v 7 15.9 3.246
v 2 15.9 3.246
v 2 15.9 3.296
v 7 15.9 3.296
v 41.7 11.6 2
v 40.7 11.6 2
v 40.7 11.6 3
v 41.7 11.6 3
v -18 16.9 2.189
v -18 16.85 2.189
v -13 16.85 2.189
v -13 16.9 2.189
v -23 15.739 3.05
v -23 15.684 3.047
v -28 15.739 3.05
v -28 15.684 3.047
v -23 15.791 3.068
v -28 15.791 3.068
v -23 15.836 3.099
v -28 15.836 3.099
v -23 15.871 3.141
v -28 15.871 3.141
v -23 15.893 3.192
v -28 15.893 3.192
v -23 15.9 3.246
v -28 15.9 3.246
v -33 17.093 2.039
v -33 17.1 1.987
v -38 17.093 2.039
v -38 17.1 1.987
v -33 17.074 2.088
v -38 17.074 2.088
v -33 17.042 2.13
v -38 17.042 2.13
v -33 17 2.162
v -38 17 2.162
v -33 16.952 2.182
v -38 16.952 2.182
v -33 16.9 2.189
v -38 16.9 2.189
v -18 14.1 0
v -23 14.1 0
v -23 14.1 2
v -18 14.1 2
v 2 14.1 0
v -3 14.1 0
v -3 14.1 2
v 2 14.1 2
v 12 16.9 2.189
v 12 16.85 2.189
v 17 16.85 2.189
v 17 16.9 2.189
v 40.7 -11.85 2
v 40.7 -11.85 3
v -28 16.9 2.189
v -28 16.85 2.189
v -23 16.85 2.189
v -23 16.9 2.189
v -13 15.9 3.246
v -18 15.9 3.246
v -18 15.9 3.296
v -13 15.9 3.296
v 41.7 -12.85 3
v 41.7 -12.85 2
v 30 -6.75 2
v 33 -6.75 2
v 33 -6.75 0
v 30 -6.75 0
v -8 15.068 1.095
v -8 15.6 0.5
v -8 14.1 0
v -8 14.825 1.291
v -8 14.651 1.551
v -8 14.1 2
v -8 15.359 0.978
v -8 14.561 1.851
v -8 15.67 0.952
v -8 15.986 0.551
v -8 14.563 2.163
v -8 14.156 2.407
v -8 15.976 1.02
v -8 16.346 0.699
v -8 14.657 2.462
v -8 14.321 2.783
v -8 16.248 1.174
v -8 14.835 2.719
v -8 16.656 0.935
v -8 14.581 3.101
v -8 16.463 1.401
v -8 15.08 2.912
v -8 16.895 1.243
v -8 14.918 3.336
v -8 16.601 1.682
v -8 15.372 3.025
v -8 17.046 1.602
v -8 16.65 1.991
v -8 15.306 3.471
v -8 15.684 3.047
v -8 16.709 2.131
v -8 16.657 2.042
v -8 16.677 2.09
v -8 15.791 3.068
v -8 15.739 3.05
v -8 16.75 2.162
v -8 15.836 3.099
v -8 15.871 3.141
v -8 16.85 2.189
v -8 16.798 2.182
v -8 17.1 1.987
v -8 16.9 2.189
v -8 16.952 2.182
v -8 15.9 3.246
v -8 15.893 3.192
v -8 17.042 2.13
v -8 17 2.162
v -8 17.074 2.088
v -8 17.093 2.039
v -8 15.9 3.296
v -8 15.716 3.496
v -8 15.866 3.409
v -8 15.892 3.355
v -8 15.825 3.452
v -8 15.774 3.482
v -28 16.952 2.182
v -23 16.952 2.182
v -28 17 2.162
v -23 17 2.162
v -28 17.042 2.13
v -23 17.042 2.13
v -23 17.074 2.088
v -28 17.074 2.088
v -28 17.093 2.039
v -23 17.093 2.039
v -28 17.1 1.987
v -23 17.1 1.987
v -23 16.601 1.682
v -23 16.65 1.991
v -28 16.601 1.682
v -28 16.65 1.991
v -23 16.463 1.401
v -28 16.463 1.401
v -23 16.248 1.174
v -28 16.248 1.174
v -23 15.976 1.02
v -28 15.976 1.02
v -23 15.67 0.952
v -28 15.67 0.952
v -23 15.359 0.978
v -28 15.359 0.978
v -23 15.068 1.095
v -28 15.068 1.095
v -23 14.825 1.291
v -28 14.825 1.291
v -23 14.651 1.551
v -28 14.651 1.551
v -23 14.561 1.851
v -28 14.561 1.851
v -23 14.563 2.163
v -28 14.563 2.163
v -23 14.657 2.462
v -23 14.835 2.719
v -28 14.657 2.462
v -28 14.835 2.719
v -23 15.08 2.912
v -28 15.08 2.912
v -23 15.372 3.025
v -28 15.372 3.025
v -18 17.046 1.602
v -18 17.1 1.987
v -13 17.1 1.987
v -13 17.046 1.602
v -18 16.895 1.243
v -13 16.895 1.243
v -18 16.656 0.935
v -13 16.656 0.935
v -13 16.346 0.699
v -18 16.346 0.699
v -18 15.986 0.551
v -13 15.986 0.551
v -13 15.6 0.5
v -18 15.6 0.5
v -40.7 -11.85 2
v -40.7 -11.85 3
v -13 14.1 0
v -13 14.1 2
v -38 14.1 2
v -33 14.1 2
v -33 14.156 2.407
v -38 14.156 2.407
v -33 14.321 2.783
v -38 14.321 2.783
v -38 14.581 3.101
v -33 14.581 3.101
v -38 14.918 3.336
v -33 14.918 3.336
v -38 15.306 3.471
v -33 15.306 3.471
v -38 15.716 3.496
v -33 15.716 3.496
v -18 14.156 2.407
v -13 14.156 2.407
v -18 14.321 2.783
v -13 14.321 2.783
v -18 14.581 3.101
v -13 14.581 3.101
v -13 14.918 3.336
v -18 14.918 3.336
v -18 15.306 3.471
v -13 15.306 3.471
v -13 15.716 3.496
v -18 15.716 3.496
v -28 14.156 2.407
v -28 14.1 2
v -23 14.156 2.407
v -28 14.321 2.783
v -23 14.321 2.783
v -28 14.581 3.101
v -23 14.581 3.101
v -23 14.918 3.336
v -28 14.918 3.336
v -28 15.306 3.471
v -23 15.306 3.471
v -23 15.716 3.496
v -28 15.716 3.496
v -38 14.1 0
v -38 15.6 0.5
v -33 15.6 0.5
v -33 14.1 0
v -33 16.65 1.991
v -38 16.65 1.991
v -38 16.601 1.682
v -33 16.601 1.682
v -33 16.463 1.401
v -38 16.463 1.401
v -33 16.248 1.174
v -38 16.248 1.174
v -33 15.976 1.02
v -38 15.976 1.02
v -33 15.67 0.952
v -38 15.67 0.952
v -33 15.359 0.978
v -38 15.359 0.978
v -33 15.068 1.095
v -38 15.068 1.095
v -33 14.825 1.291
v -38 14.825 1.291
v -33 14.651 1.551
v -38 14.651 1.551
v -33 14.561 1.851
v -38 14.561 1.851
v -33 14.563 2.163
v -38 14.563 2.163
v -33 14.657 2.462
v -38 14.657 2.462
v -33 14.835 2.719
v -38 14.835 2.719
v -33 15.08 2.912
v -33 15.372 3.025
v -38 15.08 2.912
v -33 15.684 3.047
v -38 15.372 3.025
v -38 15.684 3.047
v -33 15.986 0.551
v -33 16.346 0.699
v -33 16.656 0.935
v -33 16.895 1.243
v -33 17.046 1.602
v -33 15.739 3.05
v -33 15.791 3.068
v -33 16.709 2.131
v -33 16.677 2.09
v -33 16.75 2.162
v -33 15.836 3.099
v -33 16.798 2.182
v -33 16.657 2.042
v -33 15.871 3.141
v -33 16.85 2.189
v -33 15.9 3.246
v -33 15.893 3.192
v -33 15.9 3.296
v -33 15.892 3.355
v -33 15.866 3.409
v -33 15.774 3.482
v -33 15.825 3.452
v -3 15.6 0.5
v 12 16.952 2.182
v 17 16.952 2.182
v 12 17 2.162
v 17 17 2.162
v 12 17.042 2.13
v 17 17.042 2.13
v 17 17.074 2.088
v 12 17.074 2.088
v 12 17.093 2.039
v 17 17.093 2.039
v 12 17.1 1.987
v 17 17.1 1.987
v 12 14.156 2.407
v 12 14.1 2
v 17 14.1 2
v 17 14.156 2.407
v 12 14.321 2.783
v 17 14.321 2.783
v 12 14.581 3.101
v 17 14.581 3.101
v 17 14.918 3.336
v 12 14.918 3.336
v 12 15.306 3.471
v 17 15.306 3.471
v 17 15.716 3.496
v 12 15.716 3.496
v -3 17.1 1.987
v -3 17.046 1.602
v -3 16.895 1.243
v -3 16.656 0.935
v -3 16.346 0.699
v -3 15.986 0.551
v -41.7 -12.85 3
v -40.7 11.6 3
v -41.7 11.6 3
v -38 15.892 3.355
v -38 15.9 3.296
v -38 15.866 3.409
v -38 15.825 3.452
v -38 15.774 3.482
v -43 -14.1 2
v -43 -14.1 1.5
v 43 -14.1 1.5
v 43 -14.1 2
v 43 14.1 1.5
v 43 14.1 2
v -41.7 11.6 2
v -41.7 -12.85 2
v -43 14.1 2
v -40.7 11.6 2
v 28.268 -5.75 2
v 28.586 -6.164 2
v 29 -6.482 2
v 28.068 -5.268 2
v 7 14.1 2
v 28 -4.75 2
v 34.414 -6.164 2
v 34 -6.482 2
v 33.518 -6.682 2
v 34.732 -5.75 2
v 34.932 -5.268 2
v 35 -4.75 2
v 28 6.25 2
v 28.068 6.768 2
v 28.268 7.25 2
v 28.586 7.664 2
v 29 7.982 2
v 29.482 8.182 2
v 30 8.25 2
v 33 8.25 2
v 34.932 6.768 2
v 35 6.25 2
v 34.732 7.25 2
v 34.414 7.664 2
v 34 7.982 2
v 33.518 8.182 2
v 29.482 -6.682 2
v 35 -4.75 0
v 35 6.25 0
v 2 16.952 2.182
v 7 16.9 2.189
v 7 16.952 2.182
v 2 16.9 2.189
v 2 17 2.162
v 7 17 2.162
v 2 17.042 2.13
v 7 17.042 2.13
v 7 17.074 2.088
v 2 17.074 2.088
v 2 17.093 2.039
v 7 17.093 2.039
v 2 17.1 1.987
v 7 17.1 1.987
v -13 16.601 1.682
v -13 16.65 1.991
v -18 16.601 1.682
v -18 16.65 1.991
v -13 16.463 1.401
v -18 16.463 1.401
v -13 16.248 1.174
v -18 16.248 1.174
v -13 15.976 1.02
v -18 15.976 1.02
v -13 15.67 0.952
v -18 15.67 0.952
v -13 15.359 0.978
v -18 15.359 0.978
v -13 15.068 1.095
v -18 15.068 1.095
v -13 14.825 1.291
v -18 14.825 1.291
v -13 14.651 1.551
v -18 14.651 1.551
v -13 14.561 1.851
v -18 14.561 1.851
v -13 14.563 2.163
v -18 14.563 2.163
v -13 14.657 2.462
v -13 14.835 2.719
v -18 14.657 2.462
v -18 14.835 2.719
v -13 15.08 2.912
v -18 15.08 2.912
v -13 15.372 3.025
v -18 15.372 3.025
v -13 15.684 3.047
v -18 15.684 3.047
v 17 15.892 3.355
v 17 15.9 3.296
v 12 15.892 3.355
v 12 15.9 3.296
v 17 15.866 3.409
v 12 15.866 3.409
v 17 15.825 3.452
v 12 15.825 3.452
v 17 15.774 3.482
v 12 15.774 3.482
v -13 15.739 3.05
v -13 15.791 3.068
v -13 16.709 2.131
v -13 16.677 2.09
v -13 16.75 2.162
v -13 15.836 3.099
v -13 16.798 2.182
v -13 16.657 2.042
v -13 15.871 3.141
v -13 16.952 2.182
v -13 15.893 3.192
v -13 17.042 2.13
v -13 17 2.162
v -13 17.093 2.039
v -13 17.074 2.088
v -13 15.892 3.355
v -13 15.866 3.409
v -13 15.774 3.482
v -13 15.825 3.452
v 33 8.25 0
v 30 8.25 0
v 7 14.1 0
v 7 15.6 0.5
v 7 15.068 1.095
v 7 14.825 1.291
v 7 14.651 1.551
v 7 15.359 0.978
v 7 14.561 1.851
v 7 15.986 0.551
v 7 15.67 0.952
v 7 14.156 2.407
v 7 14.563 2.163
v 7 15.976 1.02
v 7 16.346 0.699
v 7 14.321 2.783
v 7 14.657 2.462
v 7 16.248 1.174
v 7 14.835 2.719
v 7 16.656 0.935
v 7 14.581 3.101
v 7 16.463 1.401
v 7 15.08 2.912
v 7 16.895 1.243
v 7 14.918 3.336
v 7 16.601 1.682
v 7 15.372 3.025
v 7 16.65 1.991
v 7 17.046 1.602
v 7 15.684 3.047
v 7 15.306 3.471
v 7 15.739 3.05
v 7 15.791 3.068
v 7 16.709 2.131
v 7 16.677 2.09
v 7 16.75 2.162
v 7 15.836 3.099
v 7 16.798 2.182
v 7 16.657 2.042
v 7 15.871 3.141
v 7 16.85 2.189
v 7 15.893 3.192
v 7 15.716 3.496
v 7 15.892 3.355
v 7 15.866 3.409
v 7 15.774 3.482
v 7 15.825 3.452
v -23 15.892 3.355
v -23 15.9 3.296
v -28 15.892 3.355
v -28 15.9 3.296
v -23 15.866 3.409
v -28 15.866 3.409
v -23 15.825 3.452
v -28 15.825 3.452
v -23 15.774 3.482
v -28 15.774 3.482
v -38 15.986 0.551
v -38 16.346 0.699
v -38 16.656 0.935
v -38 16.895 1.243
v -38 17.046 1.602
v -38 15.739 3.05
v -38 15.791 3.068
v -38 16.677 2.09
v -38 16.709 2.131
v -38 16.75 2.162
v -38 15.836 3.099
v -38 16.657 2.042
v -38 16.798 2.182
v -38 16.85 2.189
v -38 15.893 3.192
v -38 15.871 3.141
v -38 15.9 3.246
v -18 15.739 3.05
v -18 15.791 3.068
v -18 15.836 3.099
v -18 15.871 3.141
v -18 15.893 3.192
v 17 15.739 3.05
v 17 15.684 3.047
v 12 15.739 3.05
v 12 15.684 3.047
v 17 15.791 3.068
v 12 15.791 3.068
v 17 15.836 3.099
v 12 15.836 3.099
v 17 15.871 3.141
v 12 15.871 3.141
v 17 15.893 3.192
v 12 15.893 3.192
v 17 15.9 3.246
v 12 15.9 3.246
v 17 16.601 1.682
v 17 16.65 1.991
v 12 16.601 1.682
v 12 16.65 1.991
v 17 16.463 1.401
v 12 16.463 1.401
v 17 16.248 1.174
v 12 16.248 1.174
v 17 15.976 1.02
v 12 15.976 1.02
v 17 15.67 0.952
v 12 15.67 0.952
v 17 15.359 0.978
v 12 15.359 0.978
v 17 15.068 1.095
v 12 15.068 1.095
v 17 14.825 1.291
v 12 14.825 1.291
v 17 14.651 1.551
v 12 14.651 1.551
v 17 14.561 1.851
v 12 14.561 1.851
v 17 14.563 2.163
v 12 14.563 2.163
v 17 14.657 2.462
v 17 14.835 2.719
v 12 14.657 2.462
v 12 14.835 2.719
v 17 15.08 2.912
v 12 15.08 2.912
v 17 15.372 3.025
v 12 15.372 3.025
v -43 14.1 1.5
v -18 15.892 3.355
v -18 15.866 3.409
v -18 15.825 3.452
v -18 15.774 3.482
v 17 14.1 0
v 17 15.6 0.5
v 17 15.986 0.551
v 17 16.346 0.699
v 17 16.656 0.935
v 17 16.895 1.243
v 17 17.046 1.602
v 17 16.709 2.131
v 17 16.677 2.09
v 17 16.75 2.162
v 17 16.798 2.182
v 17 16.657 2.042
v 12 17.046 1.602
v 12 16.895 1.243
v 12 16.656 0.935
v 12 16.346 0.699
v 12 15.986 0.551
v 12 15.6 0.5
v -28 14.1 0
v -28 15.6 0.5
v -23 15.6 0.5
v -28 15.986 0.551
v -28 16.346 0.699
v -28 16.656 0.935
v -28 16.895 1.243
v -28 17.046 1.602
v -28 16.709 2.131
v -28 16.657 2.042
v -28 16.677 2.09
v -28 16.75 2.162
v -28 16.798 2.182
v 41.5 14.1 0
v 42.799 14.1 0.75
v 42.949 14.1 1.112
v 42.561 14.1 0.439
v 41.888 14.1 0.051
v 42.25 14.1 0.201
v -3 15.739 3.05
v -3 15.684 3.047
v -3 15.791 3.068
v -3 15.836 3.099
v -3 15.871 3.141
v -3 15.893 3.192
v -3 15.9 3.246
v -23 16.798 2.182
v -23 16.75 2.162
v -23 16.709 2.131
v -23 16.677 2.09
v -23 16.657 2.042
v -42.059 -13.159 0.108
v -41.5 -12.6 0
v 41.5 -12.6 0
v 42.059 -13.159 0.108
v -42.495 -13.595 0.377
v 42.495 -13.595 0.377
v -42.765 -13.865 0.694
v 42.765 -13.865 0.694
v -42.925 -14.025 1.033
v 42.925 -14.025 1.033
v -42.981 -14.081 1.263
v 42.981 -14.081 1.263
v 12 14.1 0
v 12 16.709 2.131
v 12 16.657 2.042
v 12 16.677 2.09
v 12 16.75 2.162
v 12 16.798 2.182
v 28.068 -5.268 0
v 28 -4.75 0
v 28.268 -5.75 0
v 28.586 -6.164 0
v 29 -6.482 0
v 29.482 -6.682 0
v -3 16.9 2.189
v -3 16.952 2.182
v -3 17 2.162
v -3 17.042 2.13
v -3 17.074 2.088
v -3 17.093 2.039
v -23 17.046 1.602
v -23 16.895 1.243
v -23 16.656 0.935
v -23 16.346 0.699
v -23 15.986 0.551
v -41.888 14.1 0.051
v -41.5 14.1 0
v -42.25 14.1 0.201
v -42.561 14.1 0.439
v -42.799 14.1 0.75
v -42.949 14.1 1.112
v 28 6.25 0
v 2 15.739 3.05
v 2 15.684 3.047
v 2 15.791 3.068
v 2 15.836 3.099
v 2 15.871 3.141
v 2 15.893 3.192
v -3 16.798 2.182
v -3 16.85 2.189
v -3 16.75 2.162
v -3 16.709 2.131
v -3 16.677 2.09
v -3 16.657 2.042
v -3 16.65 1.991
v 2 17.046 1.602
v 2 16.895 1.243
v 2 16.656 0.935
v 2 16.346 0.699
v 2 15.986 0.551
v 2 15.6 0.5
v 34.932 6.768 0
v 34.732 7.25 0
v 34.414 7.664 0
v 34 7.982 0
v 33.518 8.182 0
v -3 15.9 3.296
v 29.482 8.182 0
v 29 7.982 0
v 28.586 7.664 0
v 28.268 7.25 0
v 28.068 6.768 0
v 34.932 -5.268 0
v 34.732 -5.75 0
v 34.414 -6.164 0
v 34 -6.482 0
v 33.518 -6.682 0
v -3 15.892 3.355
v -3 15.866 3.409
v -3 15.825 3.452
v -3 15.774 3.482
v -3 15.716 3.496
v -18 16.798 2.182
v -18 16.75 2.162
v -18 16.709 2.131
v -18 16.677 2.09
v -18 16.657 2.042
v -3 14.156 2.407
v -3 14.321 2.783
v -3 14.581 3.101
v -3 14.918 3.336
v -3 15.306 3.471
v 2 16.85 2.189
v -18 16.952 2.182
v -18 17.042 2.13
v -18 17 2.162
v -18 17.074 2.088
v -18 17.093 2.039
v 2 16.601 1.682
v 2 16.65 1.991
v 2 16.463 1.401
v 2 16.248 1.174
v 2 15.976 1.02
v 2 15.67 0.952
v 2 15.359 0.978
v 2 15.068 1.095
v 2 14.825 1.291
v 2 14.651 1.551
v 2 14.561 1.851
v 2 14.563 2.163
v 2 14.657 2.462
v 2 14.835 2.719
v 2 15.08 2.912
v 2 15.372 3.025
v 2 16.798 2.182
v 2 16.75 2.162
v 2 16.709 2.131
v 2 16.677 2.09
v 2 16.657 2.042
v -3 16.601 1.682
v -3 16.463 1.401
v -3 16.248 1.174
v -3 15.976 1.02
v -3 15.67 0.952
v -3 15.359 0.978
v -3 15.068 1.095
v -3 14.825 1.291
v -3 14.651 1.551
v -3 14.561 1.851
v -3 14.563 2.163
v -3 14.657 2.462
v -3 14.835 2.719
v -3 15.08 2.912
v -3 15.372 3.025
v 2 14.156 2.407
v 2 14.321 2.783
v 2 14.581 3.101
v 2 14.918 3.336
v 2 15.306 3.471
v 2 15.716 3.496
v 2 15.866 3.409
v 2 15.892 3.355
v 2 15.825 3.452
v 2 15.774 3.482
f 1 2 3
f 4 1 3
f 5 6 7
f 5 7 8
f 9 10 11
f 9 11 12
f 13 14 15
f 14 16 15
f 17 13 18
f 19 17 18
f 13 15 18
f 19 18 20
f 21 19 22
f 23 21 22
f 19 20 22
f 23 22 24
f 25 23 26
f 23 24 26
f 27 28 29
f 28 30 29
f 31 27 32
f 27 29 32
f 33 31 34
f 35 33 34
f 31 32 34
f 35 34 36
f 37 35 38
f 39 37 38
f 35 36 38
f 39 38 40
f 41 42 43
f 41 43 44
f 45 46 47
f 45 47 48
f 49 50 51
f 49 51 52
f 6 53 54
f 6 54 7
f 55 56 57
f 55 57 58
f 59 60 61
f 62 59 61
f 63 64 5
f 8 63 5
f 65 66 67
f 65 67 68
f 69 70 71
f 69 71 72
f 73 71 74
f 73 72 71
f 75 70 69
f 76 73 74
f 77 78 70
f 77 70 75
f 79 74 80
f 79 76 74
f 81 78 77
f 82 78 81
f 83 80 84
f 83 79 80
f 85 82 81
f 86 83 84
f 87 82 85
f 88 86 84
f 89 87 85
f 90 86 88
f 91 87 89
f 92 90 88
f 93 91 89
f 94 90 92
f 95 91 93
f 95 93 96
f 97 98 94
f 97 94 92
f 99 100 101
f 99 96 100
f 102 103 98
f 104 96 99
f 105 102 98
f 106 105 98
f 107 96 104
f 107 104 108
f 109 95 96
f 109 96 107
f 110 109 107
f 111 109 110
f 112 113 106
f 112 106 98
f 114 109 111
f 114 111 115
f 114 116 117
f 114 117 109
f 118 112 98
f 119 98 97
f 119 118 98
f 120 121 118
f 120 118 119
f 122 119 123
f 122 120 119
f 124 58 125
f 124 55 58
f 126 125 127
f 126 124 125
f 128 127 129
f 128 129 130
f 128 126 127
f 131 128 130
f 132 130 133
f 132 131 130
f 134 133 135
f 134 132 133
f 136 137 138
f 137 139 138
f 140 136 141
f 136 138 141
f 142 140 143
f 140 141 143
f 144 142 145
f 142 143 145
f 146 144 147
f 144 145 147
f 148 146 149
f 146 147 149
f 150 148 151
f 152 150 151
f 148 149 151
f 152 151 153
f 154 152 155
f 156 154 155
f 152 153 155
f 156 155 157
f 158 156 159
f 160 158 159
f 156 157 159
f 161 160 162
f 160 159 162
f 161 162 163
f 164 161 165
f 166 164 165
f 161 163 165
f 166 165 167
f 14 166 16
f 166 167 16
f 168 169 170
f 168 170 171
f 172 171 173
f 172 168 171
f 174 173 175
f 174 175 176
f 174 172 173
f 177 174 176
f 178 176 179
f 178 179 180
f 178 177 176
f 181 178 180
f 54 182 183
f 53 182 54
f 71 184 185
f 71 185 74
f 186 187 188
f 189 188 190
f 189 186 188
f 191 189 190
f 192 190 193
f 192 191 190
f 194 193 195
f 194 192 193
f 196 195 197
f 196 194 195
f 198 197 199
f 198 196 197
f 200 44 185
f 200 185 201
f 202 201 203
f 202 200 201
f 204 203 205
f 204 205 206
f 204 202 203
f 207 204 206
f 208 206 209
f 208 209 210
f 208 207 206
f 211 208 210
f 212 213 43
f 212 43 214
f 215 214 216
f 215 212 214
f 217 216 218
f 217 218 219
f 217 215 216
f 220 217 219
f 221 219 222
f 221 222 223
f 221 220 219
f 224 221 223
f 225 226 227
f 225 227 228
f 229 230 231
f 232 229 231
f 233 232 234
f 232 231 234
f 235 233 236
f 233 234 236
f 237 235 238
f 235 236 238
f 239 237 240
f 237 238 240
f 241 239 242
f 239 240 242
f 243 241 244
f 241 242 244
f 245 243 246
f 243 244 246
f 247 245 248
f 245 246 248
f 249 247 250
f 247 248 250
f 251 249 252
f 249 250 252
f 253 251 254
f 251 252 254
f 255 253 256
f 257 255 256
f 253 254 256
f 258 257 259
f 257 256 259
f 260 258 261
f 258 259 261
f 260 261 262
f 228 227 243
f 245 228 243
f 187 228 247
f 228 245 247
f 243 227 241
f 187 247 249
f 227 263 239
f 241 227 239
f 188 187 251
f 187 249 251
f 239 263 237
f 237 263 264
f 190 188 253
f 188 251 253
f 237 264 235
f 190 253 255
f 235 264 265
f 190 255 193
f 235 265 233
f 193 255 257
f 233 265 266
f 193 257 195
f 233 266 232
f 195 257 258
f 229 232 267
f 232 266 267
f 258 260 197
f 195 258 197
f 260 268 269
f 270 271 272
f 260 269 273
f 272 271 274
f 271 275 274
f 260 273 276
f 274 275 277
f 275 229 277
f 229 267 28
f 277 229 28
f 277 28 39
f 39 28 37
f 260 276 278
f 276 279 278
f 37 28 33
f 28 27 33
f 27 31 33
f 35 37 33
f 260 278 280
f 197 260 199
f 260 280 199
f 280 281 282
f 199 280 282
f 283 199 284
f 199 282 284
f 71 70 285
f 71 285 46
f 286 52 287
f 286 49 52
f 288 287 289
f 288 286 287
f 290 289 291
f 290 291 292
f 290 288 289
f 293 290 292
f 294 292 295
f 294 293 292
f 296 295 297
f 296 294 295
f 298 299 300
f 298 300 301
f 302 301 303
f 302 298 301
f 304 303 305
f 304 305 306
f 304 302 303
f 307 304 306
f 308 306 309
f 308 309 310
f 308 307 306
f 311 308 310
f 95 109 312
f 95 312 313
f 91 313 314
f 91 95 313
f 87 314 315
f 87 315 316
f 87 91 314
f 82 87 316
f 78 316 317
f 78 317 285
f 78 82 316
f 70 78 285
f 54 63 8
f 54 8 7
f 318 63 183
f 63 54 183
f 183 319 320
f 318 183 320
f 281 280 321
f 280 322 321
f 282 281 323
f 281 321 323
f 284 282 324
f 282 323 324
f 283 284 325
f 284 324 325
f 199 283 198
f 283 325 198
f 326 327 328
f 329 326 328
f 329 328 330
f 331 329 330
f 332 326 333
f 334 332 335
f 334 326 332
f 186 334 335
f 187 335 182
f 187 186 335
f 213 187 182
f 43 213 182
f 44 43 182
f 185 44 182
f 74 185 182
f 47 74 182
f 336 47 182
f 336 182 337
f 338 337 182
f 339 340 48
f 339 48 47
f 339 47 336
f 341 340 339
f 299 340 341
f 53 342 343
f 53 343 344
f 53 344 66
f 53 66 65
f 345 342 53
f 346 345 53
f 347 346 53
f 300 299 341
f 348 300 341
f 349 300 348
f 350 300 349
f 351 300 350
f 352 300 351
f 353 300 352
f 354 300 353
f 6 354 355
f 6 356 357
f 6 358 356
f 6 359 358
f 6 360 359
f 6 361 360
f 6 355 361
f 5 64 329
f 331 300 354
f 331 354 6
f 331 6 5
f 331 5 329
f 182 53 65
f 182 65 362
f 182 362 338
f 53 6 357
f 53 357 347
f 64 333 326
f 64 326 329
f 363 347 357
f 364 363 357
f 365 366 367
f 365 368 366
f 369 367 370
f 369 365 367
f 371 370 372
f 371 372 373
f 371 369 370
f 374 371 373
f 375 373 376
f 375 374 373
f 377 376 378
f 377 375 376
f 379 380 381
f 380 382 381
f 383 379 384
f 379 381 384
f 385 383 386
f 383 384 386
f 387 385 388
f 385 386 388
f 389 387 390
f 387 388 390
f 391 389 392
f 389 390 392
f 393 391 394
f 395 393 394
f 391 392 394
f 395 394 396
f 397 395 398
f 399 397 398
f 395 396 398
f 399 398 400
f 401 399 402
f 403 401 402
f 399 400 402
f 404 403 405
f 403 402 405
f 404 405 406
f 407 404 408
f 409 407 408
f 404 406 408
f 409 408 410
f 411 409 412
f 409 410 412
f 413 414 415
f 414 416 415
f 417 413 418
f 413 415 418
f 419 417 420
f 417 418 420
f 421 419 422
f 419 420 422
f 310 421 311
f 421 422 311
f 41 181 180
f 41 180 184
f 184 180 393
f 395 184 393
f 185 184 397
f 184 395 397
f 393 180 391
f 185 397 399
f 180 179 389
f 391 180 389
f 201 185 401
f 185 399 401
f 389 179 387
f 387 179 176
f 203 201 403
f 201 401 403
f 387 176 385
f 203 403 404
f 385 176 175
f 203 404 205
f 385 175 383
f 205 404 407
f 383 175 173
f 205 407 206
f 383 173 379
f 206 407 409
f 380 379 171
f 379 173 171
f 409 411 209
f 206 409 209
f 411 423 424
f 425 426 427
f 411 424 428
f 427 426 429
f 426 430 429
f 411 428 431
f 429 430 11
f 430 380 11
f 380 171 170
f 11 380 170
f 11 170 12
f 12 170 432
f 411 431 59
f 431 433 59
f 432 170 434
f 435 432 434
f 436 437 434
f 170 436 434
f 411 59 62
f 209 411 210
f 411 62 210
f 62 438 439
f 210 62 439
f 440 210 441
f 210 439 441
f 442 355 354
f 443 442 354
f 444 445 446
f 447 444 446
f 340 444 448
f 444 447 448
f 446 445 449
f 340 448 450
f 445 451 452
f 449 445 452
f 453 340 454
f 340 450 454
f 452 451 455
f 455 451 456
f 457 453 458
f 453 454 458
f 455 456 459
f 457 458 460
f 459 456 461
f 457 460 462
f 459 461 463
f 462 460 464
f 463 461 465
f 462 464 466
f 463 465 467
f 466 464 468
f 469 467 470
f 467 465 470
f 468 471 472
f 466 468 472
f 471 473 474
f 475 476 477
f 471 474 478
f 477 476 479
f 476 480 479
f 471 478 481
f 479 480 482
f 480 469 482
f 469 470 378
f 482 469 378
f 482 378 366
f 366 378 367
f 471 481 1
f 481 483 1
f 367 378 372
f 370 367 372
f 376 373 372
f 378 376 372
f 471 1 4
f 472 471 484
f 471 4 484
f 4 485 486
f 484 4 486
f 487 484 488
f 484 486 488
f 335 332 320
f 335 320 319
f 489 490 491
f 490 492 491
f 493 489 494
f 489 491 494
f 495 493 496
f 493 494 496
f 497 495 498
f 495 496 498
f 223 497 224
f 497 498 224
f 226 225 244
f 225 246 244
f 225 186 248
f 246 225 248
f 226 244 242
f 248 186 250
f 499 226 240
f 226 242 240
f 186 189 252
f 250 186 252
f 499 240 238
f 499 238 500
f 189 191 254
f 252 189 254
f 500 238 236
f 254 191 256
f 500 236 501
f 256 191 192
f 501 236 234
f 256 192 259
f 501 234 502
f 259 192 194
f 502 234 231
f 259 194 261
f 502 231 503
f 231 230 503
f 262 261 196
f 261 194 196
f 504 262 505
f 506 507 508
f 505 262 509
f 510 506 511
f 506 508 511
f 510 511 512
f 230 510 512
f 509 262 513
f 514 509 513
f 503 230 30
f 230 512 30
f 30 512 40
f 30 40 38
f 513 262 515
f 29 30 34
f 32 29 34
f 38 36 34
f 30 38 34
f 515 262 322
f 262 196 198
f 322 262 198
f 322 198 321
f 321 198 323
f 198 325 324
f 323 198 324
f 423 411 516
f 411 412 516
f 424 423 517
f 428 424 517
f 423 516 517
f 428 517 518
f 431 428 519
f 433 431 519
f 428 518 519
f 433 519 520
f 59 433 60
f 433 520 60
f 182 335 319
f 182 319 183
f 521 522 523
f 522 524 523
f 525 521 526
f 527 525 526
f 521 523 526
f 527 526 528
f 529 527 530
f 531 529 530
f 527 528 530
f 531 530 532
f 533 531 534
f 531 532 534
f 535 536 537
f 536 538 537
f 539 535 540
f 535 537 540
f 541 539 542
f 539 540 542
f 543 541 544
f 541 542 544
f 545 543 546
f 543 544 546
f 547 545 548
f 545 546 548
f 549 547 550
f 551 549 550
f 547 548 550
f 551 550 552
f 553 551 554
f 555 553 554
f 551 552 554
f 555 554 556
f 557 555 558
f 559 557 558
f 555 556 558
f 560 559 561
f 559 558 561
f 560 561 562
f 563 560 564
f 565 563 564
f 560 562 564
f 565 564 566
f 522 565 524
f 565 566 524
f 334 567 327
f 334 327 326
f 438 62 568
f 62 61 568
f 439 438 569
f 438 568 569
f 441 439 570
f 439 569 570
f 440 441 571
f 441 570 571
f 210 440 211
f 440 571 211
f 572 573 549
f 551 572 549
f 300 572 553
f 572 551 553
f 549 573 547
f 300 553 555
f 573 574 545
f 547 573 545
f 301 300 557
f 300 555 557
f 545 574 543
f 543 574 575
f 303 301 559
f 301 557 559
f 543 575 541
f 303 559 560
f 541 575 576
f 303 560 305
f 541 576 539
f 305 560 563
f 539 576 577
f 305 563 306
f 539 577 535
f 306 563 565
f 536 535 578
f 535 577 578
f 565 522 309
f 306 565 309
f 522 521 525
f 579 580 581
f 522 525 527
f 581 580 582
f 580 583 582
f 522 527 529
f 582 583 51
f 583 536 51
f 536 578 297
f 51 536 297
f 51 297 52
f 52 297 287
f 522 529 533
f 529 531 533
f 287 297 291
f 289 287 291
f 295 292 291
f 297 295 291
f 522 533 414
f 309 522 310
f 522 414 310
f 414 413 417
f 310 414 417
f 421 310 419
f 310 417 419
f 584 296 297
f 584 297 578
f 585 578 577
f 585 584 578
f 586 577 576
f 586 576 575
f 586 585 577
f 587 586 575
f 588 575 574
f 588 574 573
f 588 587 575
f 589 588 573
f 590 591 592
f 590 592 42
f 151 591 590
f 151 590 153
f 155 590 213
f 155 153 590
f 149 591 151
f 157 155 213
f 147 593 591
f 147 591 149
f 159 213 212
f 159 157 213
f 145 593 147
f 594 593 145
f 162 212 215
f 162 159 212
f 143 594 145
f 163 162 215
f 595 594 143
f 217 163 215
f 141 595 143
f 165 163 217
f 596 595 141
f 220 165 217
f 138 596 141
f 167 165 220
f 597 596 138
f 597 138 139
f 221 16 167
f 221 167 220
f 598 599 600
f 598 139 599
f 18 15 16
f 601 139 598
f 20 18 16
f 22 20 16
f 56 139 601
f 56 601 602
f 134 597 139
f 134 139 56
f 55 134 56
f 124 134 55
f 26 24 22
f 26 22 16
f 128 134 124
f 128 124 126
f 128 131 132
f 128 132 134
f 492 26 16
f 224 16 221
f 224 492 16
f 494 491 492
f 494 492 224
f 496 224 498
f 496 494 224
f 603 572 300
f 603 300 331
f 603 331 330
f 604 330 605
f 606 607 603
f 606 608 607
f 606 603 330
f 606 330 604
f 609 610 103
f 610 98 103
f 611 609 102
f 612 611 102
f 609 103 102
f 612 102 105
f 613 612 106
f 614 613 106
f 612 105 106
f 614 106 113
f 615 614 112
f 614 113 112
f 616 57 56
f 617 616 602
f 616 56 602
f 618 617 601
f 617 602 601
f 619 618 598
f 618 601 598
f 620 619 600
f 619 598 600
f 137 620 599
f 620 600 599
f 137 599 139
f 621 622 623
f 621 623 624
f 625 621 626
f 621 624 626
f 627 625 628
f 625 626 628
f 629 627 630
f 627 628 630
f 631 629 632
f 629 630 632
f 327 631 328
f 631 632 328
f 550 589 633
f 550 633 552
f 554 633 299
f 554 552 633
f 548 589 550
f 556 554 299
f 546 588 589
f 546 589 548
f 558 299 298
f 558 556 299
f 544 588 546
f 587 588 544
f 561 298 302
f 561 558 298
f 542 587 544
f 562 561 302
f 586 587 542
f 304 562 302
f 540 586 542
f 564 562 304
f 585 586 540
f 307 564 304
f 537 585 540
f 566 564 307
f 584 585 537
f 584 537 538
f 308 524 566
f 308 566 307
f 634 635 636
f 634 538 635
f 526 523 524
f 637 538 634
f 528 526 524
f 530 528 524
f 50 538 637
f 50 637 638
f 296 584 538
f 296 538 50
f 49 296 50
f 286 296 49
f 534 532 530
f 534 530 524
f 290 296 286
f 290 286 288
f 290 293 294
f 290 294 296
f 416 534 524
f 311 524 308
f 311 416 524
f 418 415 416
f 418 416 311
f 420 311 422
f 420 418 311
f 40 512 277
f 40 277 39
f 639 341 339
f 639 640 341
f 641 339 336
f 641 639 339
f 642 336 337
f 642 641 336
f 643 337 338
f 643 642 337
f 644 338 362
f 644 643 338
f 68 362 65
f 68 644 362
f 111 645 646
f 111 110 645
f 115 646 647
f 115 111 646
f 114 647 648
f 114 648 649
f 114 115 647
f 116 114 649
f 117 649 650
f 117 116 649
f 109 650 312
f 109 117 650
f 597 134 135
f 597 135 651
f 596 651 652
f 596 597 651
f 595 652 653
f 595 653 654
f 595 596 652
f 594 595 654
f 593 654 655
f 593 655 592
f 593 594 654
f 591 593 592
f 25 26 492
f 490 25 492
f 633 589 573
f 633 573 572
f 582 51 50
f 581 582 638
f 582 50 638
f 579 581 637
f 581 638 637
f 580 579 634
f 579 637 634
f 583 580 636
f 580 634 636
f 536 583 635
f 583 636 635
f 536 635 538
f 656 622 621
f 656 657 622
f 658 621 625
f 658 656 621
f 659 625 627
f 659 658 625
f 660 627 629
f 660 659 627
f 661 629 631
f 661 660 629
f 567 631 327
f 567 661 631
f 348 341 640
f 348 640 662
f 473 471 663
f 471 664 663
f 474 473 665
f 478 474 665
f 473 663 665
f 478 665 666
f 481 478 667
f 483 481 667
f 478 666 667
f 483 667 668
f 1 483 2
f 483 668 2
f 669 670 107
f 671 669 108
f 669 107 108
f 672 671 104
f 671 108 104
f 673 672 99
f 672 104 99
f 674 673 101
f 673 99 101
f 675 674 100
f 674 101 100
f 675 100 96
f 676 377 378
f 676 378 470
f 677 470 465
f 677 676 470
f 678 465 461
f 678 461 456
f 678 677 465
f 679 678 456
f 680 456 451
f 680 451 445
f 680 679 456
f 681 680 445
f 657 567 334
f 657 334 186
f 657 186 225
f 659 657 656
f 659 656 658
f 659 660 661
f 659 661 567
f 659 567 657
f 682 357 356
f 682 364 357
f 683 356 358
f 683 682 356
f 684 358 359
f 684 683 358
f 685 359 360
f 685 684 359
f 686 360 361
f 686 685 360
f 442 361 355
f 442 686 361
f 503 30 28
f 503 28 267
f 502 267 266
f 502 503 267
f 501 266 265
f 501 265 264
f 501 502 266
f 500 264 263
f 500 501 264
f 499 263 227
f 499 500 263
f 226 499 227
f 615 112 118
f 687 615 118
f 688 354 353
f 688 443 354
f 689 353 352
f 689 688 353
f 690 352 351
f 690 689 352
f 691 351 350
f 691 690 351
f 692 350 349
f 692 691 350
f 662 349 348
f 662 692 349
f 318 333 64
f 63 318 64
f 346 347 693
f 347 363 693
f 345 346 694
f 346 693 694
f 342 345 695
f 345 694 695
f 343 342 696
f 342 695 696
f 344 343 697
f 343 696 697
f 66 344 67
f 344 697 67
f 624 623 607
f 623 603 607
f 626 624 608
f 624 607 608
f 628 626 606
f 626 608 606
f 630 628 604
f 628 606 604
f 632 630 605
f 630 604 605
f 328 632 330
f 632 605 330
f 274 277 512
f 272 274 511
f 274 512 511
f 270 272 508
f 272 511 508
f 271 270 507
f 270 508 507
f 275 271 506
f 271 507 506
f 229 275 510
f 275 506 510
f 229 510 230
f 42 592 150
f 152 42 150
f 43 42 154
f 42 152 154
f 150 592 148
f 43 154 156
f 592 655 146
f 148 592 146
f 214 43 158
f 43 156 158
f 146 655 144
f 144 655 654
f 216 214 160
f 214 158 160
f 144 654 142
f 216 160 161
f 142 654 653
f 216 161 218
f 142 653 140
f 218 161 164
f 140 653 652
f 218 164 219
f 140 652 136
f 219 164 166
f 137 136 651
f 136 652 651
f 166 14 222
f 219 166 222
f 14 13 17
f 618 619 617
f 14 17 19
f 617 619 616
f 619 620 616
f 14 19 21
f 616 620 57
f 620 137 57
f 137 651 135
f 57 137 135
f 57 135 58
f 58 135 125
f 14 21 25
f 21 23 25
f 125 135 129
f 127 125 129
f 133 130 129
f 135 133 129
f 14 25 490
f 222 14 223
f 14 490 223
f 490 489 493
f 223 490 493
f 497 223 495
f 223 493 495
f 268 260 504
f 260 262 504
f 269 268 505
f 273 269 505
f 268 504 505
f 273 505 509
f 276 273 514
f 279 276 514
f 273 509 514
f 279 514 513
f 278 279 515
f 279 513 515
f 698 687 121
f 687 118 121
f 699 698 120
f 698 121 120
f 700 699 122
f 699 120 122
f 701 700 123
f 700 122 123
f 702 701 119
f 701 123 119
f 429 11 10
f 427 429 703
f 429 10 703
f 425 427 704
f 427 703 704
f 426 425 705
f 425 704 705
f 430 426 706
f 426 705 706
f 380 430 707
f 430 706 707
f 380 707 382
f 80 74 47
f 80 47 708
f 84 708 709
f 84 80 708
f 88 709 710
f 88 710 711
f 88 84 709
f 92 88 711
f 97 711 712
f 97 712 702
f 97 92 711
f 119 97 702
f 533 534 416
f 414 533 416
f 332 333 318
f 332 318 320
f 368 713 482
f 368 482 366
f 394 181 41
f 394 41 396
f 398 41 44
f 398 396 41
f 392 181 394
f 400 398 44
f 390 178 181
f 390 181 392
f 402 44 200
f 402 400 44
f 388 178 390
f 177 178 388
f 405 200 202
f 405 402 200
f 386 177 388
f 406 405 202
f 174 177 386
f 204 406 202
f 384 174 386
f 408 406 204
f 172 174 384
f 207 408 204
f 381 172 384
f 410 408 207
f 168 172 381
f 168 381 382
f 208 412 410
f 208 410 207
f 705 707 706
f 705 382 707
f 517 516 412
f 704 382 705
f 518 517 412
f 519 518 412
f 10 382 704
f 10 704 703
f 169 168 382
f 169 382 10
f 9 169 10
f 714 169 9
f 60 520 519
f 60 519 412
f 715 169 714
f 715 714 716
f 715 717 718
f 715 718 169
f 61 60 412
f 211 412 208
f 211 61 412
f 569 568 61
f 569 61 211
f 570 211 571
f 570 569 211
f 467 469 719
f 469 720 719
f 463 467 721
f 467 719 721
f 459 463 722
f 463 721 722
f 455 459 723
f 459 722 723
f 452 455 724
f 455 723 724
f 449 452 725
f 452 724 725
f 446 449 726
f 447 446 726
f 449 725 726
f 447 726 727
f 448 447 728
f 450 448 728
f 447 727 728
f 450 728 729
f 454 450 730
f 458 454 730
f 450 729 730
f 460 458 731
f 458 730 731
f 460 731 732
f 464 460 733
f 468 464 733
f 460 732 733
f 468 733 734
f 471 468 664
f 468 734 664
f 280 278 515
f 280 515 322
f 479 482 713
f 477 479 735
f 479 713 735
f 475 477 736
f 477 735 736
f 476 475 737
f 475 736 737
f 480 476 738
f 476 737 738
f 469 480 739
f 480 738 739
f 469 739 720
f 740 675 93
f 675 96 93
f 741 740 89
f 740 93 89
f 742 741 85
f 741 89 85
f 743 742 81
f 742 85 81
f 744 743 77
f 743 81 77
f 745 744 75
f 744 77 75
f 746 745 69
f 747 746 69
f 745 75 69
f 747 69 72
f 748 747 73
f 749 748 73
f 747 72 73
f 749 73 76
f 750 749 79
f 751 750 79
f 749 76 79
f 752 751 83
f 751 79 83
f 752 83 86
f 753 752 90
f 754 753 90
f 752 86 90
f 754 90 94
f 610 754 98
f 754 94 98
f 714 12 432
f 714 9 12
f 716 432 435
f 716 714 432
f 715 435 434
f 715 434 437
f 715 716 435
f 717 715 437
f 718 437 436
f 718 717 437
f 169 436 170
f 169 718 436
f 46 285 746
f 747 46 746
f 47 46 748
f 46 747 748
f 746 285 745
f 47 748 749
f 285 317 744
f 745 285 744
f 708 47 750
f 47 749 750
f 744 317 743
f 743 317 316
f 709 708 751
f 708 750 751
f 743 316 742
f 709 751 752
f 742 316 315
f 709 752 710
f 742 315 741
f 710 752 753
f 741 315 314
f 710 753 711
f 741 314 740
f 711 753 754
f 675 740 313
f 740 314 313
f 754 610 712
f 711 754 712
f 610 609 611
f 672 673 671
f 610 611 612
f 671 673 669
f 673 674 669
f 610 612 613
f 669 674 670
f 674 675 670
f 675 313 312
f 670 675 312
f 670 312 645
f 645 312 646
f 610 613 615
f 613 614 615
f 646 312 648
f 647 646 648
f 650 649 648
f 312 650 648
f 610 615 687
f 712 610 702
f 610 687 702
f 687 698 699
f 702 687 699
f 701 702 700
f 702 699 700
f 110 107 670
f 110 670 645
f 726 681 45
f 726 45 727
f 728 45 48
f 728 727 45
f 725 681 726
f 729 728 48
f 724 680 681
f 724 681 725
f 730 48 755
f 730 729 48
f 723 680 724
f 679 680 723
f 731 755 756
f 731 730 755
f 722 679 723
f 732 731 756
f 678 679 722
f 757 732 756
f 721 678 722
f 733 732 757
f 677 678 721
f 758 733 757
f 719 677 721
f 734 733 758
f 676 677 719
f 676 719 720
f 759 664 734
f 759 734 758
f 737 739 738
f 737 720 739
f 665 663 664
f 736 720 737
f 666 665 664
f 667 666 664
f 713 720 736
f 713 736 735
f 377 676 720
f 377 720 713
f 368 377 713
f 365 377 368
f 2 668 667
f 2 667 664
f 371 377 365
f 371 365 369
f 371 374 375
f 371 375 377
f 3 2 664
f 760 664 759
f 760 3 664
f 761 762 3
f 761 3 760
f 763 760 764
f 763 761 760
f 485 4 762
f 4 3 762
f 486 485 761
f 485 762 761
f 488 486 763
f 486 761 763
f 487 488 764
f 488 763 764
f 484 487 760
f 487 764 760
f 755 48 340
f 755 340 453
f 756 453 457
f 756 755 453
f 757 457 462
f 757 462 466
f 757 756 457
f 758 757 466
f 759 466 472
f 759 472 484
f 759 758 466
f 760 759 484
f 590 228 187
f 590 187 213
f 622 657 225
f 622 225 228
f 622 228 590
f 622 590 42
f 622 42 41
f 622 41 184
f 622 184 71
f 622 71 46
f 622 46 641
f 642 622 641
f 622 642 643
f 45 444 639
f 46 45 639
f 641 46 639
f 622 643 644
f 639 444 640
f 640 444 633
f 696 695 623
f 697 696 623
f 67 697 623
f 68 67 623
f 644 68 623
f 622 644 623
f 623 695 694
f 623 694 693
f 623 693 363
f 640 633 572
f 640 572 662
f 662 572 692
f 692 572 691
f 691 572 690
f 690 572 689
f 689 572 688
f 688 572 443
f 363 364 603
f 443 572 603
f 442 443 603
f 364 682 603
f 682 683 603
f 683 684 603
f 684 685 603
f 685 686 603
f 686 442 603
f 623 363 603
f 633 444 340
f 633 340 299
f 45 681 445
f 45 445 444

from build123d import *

# Parameters (mm, degrees)
SKETCH1_W               = 86
SKETCH1_H               = 28.2
BOSS_EXTRUDE1_DEPTH     = 2
SKETCH5_R               = 1.05
BOSS_EXTRUDE2_DEPTH     = 5
SKETCH8_W               = 1.75956426
SKETCH8_H               = 1.75956426
CUT_EXTRUDE3_DEPTH      = 5
FILLET4_R               = 0.2
LPATTERN1_COUNT         = 12
LPATTERN1_PITCH         = 5
LPATTERN1_2_COUNT       = 12
LPATTERN1_2_PITCH       = 5
FILLET4_OF_LPATTERN1_R  = 0.2
CUT_EXTRUDE1_START      = -43
CUT_EXTRUDE1_DEPTH      = 5
FILLET5_R               = 1.5
BOSS_EXTRUDE3_DEPTH     = 1
CUT_EXTRUDE6_DEPTH      = 47.407525329
CUT_EXTRUDE6_DEPTH_BACK = 47.407525329
SKETCH10_W              = 7
SKETCH10_H              = 15
FILLET6_R               = 2


# Read off the part's stored shape, not the designer's step: Cut-Extrude1
with BuildPart() as part:
    # Sketch1 → Boss-Extrude1 (new body)
    with BuildSketch(Plane.XY):
        Rectangle(SKETCH1_W, SKETCH1_H)
    extrude(amount=BOSS_EXTRUDE1_DEPTH)


with BuildPart() as body_2:
    # Sketch5 → Boss-Extrude2 (new body)
    with BuildSketch(Plane.ZY.offset(43)):
        with BuildLine():
            Line((0.5, 15.6), (0, 14.1))
            Line((0, 14.1), (2, 14.1))
            ThreePointArc((2, 14.1), (3.060660172, 16.660660172), (0.5, 15.6))
        make_face()
        with Locations((2, 15.6)):
            Circle(SKETCH5_R, mode=Mode.SUBTRACT)
    boss_extrude2 = extrude(amount=-BOSS_EXTRUDE2_DEPTH)

    # Sketch8 → Cut-Extrude3 (cut)
    with BuildSketch(Plane.ZY.offset(43)):
        with Locations((3.068777943, 16.78020761)):
            Rectangle(SKETCH8_W, SKETCH8_H)
    cut_extrude3 = extrude(amount=-CUT_EXTRUDE3_DEPTH, mode=Mode.SUBTRACT)

    # Fillet4
    fillet4_edges = [body_2.edges().sort_by_distance(p)[0] for p in [
        (-40.5, 16.632850707, 2.188995813),
        (-40.5, 15.90042548, 3.006103638),
        (-40.5, 17.088045894, 2.188995813),
        (-40.5, 15.90042548, 3.469606931),
    ]]
    fillet(fillet4_edges, radius=FILLET4_R)


with BuildPart() as part_1:
    add(part.part)

    add(body_2.part)  # LPattern1 merges body 2
    # LPattern1: Boss-Extrude2 ×12, 5 skipped
    with Locations(*[(i * LPATTERN1_PITCH, 0, 0) for i in range(1, LPATTERN1_COUNT) if i not in (2, 4, 6, 8, 10)]):
        add(boss_extrude2)

    # LPattern1 2: Cut-Extrude3 ×12, 5 skipped
    with Locations(*[(i * LPATTERN1_2_PITCH, 0, 0) for i in range(1, LPATTERN1_2_COUNT) if i not in (2, 4, 6, 8, 10)]):
        add(cut_extrude3, mode=Mode.SUBTRACT)

    # Fillet4 of LPattern1
    fillet4_of_lpattern1_edges = [part_1.edges().sort_by_distance(p)[0] for p in [
        (-35.5, 16.632850707, 2.188995813),
        (-35.5, 15.90042548, 3.006103638),
        (-35.5, 17.088045894, 2.188995813),
        (-35.5, 15.90042548, 3.469606931),
        (-25.5, 16.632850707, 2.188995813),
        (-25.5, 15.90042548, 3.006103638),
        (-25.5, 17.088045894, 2.188995813),
        (-25.5, 15.90042548, 3.469606931),
        (-15.5, 16.632850707, 2.188995813),
        (-15.5, 15.90042548, 3.006103638),
        (-15.5, 17.088045894, 2.188995813),
        (-15.5, 15.90042548, 3.469606931),
        (-5.5, 16.632850707, 2.188995813),
        (-5.5, 15.90042548, 3.006103638),
        (-5.5, 17.088045894, 2.188995813),
        (-5.5, 15.90042548, 3.469606931),
        (4.5, 16.632850707, 2.188995813),
        (4.5, 15.90042548, 3.006103638),
        (4.5, 17.088045894, 2.188995813),
        (4.5, 15.90042548, 3.469606931),
        (14.5, 16.632850707, 2.188995813),
        (14.5, 15.90042548, 3.006103638),
        (14.5, 17.088045894, 2.188995813),
        (14.5, 15.90042548, 3.469606931),
    ]]
    fillet(fillet4_of_lpattern1_edges, radius=FILLET4_OF_LPATTERN1_R)

    # Cut-Extrude1 outline → Cut-Extrude1 (cut)
    with BuildSketch(Plane.YZ.offset(CUT_EXTRUDE1_START)):
        with BuildLine():
            Line((14.1, 2), (14.1, 0))
            Line((14.1, 0), (15.6, 0.5))
            ThreePointArc((15.6, 0.5), (16.656161515, 0.934860171), (17.09994626, 1.987302861))
            ThreePointArc((17.09994626, 1.987302861), (17.041972069, 2.129817348), (16.899953425, 2.188995813))
            Line((16.899953425, 2.188995813), (16.849951562, 2.188995813))
            ThreePointArc((16.849951562, 2.188995813), (16.709154073, 2.131038296), (16.649959312, 1.990756483))
            ThreePointArc((16.649959312, 1.990756483), (14.825162546, 1.291390855), (15.684357403, 3.046605861))
            ThreePointArc((15.684357403, 3.046605861), (15.836046984, 3.098966816), (15.90042548, 3.245959359))
            Line((15.90042548, 3.245959359), (15.90042548, 3.296115243))
            ThreePointArc((15.90042548, 3.296115243), (15.847207656, 3.431964397), (15.715875553, 3.495517588))
            ThreePointArc((15.715875553, 3.495517588), (14.581131346, 3.100866325), (14.1, 2))
        make_face()
    extrude(amount=CUT_EXTRUDE1_DEPTH, mode=Mode.SUBTRACT)

    # Fillet5
    fillet5_edges = [part_1.edges().sort_by_distance(p)[0] for p in [
        (0, -14.1, 0),
        (-43, 0, 0),
        (43, 0, 0),
    ]]
    fillet(fillet5_edges, radius=FILLET5_R)

    # Sketch9 → Boss-Extrude3 (add)
    with BuildSketch(Plane.XY.offset(2)):
        Polygon((-41.7, 11.6), (-40.7, 11.6), (-40.7, -11.85), (40.7, -11.85), (40.7, 11.6), (41.7, 11.6), (41.7, -11.85), (41.7, -12.85), (-40.7, -12.85), (-41.7, -12.85), align=None)
    extrude(amount=BOSS_EXTRUDE3_DEPTH)

    # Sketch10 → Cut-Extrude6 (cut, two sides: drawn at the far end of the back side and taken through both)
    with BuildSketch(Plane(origin=(0, 0, 0), x_dir=(-1, 0, 0), z_dir=(0, 0, -1)).offset(-CUT_EXTRUDE6_DEPTH_BACK)):
        with Locations((-31.5, 0.75)):
            Rectangle(SKETCH10_W, SKETCH10_H)
    extrude(amount=CUT_EXTRUDE6_DEPTH + CUT_EXTRUDE6_DEPTH_BACK, mode=Mode.SUBTRACT)

    # Fillet6
    fillet6_edges = [part_1.edges().sort_by_distance(p)[0] for p in [
        (28, -6.75, 1),
        (28, 8.25, 1),
        (35, 8.25, 1),
        (35, -6.75, 1),
    ]]
    fillet(fillet6_edges, radius=FILLET6_R)


solid = part_1.part
